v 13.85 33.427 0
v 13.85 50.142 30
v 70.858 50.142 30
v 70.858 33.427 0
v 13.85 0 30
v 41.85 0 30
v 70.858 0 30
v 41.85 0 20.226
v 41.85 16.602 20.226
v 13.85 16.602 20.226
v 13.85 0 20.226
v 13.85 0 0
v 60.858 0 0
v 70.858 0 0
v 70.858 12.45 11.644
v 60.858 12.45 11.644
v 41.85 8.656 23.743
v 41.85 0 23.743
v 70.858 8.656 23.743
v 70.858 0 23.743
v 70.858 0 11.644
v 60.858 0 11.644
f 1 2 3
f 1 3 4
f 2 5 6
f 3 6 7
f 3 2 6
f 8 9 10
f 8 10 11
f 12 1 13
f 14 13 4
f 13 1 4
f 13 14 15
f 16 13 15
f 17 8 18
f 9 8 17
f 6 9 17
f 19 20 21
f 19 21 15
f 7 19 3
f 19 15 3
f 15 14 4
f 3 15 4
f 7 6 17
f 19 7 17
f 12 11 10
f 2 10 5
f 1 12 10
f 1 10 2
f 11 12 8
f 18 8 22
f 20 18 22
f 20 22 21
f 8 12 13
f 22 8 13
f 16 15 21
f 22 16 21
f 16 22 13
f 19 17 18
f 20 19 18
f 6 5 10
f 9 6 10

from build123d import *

# Parameters (mm, degrees)
SKETCH_1_W          = 57.008230548
SKETCH_1_H          = 50.142083818
EXTRUDE_2_DEPTH     = 30
CUT_EXTRUDE_1_DEPTH = 82.634348897
CUT_EXTRUDE_2_DEPTH = 10
CUT_EXTRUDE_3_DEPTH = 28
CUT_EXTRUDE_4_DEPTH = 82.634348897


with BuildPart() as part:
    # 草圖1 → 填料-伸長2 (new body)
    with BuildSketch(Plane.XY):
        with Locations((42.353664605, 25.071041909)):
            Rectangle(SKETCH_1_W, SKETCH_1_H)
    extrude(amount=EXTRUDE_2_DEPTH)

    # 草圖2 → 除料-伸長1 (cut, through all)
    with BuildSketch(Plane.ZY.offset(-13.849549331)):
        Polygon((30, 50.142083818), (0, 33.426531832), (0, 50.142083818), align=None)
    extrude(amount=-CUT_EXTRUDE_1_DEPTH, mode=Mode.SUBTRACT)

    # 草圖3 → 除料-伸長2 (cut)
    with BuildSketch(Plane(origin=(70.857779879, 0, 0), x_dir=(0, 0, -1), z_dir=(1, 0, 0))):
        Polygon((-11.643819947, 12.450406502), (-11.643819947, 0), (0, 0), align=None)
    extrude(amount=-CUT_EXTRUDE_2_DEPTH, mode=Mode.SUBTRACT)

    # 草圖6 → 除料-伸長3 (cut)
    with BuildSketch(Plane.ZY.offset(-13.849549331)):
        Polygon((30, 0), (20.225842112, 16.602142494), (20.225842112, 0), align=None)
    extrude(amount=-CUT_EXTRUDE_3_DEPTH, mode=Mode.SUBTRACT)

    # 草圖7 → 除料-伸長4 (cut, through all)
    with BuildSketch(Plane(origin=(70.857779879, 0, 0), x_dir=(0, 0, -1), z_dir=(1, 0, 0))):
        Polygon((-30, 0), (-23.742805889, 8.65630368), (-23.742805889, 0), align=None)
    extrude(amount=-CUT_EXTRUDE_4_DEPTH, mode=Mode.SUBTRACT)


solid = part.part
